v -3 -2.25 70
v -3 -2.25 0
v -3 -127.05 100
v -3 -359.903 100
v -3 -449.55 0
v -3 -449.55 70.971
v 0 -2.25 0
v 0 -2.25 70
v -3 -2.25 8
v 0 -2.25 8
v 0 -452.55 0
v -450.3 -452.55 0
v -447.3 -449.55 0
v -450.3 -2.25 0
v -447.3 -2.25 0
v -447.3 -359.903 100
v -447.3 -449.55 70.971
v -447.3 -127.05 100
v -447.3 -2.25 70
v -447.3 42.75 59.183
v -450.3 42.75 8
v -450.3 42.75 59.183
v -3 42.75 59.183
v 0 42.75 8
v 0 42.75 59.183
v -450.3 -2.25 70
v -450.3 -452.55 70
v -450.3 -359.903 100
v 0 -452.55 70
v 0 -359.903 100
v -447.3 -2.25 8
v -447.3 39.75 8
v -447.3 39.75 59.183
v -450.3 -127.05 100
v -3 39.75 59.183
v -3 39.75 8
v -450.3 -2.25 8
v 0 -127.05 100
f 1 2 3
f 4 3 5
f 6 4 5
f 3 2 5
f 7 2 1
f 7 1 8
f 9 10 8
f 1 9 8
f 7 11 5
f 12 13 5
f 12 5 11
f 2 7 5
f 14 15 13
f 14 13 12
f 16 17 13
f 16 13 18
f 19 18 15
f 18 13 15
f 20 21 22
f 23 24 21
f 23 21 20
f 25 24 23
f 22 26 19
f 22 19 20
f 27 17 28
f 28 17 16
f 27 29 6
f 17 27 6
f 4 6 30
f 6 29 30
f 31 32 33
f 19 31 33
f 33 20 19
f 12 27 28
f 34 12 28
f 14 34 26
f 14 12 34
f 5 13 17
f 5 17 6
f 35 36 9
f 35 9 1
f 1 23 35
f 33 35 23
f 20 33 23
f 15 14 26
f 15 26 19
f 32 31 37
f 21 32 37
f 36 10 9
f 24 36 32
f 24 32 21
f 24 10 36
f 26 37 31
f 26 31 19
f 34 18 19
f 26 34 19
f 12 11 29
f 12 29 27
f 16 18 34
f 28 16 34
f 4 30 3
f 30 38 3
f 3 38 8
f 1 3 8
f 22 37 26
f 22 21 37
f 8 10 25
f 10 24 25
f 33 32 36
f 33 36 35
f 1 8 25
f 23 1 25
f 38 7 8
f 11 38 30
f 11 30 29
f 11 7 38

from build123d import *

# Parameters (mm, degrees)
BOSS_EXTRU_1_DEPTH      = 100
ENL_V_MAT_EXTRU_1_DEPTH = 496
BOSS_EXTRU_8_DEPTH      = 3
BOSS_EXTRU_9_DEPTH      = 3
ESQUISSE11_W            = 51.182692308
ESQUISSE11_H            = 3
BOSS_EXTRU_10_DEPTH     = 444.3


with BuildPart() as part:
    # Esquisse1 → Boss.-Extru.1 (new body)
    with BuildSketch(Plane.XY):
        Polygon((-447.3, -5.25), (-447.3, -449.55), (-3, -449.55), (-3, -5.25), (-3, -2.25), (0, -2.25), (0, -452.55), (-450.3, -452.55), (-450.3, -2.25), (-447.3, -2.25), align=None)
    extrude(amount=BOSS_EXTRU_1_DEPTH)

    # Esquisse2 → Enlèv. mat.-Extru.1 (cut)
    with BuildSketch(Plane(origin=(0, 0, 0), x_dir=(0, 0, -1), z_dir=(1, 0, 0))):
        Polygon((-70, -452.55), (-100, -359.902941176), (-100, -452.55), align=None)
        Polygon((-100, -127.05), (-70, -2.25), (-100, -2.25), align=None)
    extrude(amount=-ENL_V_MAT_EXTRU_1_DEPTH, mode=Mode.SUBTRACT)


with BuildPart() as body_2:
    # Esquisse9 → Boss.-Extru.8 (new body)
    with BuildSketch(Plane.ZY.offset(450.3)):
        Polygon((8, -2.25), (70, -2.25), (59.182692308, 42.75), (8, 42.75), align=None)
    extrude(amount=-BOSS_EXTRU_8_DEPTH)



with BuildPart() as body_3:
    # Esquisse10 → Boss.-Extru.9 (new body)
    with BuildSketch(Plane(origin=(0, 0, 0), x_dir=(0, 0, -1), z_dir=(1, 0, 0))):
        Polygon((-8, -2.25), (-70, -2.25), (-59.182692308, 42.75), (-8, 42.75), align=None)
    extrude(amount=-BOSS_EXTRU_9_DEPTH)


with BuildPart() as body_2_1:
    add(body_2.part)

    add(body_3.part)  # Boss.-Extru.10 merges body 3
    # Esquisse11 → Boss.-Extru.10 (add)
    with BuildSketch(Plane.ZY.offset(3)):
        with Locations((33.591346154, 41.25)):
            Rectangle(ESQUISSE11_W, ESQUISSE11_H)
    extrude(amount=BOSS_EXTRU_10_DEPTH)


solid = Compound([part.part, body_2_1.part])
